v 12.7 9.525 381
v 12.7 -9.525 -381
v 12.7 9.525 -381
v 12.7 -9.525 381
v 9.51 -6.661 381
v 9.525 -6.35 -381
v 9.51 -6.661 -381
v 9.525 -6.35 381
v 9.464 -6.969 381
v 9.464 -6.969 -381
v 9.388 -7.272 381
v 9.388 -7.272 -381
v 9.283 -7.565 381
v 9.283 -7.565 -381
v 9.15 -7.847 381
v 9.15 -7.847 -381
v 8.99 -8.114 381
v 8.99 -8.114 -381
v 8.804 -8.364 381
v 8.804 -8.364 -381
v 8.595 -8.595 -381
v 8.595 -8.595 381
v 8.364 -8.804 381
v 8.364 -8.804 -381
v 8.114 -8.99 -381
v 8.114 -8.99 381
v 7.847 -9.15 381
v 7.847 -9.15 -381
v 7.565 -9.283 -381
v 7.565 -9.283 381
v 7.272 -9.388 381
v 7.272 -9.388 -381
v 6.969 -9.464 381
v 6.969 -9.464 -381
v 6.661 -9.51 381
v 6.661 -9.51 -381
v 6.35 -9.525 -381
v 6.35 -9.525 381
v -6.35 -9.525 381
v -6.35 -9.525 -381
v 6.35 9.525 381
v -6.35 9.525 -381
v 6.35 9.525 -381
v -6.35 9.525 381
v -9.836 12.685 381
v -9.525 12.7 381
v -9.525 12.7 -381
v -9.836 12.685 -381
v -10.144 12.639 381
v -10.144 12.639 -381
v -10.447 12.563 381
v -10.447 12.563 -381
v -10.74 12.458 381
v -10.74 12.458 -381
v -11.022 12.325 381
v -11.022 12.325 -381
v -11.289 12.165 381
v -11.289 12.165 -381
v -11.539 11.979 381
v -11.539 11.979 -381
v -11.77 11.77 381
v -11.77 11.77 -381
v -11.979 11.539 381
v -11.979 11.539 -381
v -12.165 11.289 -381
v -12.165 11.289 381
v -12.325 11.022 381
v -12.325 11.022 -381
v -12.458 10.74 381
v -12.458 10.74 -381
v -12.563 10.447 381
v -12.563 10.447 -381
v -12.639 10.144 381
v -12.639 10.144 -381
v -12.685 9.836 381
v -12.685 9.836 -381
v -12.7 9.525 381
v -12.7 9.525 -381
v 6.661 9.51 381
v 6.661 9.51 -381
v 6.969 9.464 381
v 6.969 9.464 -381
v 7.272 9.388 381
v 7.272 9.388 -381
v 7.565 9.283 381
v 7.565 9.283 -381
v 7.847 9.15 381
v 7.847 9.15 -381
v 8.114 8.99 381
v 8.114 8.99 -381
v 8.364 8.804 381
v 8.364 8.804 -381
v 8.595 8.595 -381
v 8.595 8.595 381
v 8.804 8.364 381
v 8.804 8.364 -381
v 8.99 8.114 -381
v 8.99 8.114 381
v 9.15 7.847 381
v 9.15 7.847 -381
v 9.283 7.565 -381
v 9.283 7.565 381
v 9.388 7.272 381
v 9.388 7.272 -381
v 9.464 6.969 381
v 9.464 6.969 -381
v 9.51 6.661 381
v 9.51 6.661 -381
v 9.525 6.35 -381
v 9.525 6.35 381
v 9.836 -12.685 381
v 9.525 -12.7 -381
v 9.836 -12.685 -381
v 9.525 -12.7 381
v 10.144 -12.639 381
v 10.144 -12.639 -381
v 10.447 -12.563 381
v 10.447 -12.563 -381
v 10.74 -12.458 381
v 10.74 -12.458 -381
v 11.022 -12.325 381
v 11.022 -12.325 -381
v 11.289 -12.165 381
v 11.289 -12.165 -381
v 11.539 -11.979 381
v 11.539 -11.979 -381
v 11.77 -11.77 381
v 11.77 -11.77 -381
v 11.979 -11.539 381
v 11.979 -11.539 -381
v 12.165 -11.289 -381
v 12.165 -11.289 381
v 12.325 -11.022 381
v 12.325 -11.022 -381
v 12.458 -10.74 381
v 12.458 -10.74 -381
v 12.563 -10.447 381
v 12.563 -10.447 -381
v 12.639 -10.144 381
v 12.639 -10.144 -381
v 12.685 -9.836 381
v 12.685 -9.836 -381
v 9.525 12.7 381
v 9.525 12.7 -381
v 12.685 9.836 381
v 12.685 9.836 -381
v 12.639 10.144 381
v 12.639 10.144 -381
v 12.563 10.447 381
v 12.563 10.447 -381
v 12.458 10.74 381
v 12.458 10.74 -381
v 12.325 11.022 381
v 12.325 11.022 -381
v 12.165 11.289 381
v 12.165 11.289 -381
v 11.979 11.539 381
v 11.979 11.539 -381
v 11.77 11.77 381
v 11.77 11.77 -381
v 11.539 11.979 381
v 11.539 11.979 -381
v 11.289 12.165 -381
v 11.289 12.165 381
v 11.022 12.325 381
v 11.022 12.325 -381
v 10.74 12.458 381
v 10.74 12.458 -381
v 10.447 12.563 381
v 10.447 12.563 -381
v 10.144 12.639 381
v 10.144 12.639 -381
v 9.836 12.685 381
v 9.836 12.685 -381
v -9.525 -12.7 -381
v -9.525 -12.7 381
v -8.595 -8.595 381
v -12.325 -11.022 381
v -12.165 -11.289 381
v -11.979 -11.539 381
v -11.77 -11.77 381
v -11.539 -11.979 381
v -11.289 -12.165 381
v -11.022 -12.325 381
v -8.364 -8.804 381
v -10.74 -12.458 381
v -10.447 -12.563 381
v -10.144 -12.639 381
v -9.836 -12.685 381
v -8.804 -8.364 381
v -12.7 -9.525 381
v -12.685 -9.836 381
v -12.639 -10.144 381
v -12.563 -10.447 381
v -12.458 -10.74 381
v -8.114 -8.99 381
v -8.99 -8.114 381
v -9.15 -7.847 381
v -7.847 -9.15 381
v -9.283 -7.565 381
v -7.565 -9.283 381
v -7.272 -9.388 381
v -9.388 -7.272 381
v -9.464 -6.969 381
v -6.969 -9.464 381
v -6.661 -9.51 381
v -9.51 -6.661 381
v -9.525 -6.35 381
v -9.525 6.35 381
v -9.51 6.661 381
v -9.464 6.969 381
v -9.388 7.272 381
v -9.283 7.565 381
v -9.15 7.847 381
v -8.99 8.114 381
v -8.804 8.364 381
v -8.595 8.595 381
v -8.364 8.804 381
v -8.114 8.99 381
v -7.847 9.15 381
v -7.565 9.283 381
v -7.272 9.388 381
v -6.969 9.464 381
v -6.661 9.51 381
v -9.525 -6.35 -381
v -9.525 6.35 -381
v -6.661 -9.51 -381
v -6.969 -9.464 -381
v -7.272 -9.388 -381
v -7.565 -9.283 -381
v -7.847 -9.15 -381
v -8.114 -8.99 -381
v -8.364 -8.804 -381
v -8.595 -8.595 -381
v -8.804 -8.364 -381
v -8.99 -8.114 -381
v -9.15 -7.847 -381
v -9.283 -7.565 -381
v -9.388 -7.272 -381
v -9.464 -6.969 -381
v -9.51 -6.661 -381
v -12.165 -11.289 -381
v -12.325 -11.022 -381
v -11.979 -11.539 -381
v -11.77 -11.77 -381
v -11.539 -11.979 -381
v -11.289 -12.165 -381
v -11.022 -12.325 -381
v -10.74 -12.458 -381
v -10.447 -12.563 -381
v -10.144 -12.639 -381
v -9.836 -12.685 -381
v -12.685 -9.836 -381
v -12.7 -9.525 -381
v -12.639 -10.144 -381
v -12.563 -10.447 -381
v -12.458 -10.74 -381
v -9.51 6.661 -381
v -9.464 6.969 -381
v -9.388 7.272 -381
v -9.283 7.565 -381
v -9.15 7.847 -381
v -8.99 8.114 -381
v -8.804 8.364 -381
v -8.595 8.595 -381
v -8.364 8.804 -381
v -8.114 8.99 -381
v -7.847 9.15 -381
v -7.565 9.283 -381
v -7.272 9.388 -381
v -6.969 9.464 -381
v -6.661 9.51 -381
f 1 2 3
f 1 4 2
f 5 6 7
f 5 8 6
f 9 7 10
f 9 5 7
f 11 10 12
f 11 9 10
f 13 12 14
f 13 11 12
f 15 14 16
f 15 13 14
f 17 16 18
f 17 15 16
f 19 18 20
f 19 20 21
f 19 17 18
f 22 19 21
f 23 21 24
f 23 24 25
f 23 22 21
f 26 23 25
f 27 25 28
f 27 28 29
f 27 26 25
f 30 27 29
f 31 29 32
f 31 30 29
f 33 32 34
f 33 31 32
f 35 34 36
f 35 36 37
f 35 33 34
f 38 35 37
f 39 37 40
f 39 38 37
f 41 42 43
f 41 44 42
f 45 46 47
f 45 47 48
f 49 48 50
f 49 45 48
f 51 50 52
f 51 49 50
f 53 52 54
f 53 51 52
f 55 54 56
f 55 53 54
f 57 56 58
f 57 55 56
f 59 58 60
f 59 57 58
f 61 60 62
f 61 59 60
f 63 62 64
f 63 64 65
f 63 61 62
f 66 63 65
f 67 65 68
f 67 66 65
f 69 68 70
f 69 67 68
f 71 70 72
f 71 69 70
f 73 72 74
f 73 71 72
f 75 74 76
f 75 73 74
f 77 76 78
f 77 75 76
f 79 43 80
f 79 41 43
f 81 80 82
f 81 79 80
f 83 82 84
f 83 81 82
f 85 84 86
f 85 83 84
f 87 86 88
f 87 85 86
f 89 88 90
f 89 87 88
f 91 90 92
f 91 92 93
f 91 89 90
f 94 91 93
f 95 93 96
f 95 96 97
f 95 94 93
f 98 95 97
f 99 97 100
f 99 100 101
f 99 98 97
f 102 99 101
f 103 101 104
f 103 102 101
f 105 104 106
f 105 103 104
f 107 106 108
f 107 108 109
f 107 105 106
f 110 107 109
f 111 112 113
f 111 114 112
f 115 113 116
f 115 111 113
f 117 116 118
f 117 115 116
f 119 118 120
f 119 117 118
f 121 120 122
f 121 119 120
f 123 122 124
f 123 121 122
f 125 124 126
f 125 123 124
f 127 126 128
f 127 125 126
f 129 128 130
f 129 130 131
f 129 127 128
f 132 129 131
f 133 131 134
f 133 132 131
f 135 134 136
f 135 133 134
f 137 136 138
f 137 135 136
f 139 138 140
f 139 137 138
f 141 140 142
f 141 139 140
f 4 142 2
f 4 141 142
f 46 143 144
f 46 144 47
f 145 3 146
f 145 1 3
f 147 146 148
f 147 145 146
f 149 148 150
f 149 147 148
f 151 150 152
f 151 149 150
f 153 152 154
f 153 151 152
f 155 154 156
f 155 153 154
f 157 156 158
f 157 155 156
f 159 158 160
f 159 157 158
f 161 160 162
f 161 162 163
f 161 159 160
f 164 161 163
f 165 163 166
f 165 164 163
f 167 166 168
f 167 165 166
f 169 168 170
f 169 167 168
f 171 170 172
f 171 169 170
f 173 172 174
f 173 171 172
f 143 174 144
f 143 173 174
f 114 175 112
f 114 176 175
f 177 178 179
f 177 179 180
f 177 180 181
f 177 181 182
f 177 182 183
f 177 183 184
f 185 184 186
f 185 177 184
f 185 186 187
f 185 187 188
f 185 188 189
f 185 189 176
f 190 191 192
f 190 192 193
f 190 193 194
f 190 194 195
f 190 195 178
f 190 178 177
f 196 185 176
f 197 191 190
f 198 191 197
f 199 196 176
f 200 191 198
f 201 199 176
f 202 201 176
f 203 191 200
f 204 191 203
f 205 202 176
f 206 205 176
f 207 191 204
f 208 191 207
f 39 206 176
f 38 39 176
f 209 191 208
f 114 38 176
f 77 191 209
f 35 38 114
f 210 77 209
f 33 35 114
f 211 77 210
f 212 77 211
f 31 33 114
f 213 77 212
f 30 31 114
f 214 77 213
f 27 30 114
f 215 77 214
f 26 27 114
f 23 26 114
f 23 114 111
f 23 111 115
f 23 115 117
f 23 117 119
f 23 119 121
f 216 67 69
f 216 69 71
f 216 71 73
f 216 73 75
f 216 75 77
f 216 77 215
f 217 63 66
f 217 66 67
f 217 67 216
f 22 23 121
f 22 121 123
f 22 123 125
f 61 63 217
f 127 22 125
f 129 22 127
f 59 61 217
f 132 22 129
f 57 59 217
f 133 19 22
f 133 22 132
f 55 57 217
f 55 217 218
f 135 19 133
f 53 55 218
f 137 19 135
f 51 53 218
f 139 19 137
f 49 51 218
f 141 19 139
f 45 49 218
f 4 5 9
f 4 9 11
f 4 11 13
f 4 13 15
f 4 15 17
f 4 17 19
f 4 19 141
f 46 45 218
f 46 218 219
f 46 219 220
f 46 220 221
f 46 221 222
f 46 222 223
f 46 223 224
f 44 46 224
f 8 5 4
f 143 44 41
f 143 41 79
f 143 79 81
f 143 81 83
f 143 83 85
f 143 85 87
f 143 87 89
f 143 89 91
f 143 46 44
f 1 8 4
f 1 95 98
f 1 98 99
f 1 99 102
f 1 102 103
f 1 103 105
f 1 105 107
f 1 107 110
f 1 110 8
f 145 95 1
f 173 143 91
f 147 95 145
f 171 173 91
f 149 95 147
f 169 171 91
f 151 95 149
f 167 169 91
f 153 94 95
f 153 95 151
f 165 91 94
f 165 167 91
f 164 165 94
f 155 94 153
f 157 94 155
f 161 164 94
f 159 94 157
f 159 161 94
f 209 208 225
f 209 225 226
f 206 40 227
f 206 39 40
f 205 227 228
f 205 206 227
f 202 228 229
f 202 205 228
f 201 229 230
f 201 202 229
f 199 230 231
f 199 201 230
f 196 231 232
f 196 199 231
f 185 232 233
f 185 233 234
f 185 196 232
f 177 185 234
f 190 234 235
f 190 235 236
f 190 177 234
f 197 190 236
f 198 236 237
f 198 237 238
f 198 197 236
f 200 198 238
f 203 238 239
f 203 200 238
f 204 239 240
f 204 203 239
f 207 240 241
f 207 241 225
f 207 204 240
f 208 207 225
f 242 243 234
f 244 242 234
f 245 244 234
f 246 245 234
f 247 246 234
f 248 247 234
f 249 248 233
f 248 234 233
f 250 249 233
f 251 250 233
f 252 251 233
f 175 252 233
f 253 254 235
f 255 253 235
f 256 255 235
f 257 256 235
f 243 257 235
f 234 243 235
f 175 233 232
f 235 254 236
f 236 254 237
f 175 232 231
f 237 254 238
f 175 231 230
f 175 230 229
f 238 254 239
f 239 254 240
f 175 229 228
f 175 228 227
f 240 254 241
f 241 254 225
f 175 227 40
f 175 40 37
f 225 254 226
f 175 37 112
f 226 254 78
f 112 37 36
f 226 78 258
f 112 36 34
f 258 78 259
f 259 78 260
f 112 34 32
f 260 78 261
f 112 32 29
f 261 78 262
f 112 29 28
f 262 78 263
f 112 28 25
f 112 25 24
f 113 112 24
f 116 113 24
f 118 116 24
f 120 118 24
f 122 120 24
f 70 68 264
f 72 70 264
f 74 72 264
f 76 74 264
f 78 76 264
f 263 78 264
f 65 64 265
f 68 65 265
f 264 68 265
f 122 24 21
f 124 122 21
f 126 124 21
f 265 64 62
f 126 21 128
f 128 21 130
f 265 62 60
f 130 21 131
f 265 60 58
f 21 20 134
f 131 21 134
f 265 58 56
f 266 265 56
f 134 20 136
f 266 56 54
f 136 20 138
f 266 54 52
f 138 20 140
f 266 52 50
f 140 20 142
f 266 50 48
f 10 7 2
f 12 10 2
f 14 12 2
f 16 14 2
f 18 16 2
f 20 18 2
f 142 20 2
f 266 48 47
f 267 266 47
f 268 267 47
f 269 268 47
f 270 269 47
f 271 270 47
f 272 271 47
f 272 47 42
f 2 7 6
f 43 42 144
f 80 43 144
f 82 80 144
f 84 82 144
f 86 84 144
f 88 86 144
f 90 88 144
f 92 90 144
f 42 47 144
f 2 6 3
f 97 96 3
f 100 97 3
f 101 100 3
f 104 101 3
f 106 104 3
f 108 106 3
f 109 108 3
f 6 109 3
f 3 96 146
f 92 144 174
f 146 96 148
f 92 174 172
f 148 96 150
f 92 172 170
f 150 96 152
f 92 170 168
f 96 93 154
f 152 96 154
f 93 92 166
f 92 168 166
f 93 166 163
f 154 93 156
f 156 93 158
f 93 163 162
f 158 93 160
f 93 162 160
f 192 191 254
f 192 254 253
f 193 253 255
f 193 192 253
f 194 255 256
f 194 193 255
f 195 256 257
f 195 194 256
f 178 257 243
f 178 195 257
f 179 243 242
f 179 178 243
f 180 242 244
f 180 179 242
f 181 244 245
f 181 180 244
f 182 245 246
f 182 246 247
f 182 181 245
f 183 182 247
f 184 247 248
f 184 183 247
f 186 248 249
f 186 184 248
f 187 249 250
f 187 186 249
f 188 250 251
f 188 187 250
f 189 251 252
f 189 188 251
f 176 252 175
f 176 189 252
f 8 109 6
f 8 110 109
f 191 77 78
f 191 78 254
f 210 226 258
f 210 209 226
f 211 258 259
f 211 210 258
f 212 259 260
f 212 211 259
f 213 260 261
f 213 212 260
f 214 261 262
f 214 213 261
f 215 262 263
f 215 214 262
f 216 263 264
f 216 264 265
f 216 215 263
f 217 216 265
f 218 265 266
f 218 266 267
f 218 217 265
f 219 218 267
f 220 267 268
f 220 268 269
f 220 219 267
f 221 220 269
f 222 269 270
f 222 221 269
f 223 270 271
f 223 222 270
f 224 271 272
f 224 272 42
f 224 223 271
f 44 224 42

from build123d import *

# Parameters (mm, degrees)
F1_DEPTH      = 381
F1_DEPTH_BACK = 381


with BuildPart() as f1:
    # F0 (on Top) → F1 (new body, two sides)
    with BuildSketch(Plane.XY) as f1_sk:
        with BuildLine():
            ThreePointArc((12.7, 9.525), (11.770064, 11.770064), (9.525, 12.7))
            Line((9.525, 12.7), (-9.525, 12.7))
            ThreePointArc((-9.525, 12.7), (-11.770064, 11.770064), (-12.7, 9.525))
            Line((-12.7, 9.525), (-12.7, -9.525))
            ThreePointArc((-12.7, -9.525), (-11.770064, -11.770064), (-9.525, -12.7))
            Line((-9.525, -12.7), (9.525, -12.7))
            ThreePointArc((9.525, -12.7), (11.770064, -11.770064), (12.7, -9.525))
            Line((12.7, -9.525), (12.7, 9.525))
        make_face()
        with BuildLine():
            Line((-9.525, -6.35), (-9.525, 6.35))
            ThreePointArc((-9.525, 6.35), (-8.595064, 8.595064), (-6.35, 9.525))
            Line((-6.35, 9.525), (6.35, 9.525))
            ThreePointArc((6.35, 9.525), (8.595064, 8.595064), (9.525, 6.35))
            Line((9.525, 6.35), (9.525, -6.35))
            ThreePointArc((9.525, -6.35), (8.595064, -8.595064), (6.35, -9.525))
            Line((6.35, -9.525), (-6.35, -9.525))
            ThreePointArc((-6.35, -9.525), (-8.595064, -8.595064), (-9.525, -6.35))
        make_face(mode=Mode.SUBTRACT)
    extrude(amount=F1_DEPTH)
    extrude(f1_sk.sketch, amount=-F1_DEPTH_BACK)


solid = f1.part
